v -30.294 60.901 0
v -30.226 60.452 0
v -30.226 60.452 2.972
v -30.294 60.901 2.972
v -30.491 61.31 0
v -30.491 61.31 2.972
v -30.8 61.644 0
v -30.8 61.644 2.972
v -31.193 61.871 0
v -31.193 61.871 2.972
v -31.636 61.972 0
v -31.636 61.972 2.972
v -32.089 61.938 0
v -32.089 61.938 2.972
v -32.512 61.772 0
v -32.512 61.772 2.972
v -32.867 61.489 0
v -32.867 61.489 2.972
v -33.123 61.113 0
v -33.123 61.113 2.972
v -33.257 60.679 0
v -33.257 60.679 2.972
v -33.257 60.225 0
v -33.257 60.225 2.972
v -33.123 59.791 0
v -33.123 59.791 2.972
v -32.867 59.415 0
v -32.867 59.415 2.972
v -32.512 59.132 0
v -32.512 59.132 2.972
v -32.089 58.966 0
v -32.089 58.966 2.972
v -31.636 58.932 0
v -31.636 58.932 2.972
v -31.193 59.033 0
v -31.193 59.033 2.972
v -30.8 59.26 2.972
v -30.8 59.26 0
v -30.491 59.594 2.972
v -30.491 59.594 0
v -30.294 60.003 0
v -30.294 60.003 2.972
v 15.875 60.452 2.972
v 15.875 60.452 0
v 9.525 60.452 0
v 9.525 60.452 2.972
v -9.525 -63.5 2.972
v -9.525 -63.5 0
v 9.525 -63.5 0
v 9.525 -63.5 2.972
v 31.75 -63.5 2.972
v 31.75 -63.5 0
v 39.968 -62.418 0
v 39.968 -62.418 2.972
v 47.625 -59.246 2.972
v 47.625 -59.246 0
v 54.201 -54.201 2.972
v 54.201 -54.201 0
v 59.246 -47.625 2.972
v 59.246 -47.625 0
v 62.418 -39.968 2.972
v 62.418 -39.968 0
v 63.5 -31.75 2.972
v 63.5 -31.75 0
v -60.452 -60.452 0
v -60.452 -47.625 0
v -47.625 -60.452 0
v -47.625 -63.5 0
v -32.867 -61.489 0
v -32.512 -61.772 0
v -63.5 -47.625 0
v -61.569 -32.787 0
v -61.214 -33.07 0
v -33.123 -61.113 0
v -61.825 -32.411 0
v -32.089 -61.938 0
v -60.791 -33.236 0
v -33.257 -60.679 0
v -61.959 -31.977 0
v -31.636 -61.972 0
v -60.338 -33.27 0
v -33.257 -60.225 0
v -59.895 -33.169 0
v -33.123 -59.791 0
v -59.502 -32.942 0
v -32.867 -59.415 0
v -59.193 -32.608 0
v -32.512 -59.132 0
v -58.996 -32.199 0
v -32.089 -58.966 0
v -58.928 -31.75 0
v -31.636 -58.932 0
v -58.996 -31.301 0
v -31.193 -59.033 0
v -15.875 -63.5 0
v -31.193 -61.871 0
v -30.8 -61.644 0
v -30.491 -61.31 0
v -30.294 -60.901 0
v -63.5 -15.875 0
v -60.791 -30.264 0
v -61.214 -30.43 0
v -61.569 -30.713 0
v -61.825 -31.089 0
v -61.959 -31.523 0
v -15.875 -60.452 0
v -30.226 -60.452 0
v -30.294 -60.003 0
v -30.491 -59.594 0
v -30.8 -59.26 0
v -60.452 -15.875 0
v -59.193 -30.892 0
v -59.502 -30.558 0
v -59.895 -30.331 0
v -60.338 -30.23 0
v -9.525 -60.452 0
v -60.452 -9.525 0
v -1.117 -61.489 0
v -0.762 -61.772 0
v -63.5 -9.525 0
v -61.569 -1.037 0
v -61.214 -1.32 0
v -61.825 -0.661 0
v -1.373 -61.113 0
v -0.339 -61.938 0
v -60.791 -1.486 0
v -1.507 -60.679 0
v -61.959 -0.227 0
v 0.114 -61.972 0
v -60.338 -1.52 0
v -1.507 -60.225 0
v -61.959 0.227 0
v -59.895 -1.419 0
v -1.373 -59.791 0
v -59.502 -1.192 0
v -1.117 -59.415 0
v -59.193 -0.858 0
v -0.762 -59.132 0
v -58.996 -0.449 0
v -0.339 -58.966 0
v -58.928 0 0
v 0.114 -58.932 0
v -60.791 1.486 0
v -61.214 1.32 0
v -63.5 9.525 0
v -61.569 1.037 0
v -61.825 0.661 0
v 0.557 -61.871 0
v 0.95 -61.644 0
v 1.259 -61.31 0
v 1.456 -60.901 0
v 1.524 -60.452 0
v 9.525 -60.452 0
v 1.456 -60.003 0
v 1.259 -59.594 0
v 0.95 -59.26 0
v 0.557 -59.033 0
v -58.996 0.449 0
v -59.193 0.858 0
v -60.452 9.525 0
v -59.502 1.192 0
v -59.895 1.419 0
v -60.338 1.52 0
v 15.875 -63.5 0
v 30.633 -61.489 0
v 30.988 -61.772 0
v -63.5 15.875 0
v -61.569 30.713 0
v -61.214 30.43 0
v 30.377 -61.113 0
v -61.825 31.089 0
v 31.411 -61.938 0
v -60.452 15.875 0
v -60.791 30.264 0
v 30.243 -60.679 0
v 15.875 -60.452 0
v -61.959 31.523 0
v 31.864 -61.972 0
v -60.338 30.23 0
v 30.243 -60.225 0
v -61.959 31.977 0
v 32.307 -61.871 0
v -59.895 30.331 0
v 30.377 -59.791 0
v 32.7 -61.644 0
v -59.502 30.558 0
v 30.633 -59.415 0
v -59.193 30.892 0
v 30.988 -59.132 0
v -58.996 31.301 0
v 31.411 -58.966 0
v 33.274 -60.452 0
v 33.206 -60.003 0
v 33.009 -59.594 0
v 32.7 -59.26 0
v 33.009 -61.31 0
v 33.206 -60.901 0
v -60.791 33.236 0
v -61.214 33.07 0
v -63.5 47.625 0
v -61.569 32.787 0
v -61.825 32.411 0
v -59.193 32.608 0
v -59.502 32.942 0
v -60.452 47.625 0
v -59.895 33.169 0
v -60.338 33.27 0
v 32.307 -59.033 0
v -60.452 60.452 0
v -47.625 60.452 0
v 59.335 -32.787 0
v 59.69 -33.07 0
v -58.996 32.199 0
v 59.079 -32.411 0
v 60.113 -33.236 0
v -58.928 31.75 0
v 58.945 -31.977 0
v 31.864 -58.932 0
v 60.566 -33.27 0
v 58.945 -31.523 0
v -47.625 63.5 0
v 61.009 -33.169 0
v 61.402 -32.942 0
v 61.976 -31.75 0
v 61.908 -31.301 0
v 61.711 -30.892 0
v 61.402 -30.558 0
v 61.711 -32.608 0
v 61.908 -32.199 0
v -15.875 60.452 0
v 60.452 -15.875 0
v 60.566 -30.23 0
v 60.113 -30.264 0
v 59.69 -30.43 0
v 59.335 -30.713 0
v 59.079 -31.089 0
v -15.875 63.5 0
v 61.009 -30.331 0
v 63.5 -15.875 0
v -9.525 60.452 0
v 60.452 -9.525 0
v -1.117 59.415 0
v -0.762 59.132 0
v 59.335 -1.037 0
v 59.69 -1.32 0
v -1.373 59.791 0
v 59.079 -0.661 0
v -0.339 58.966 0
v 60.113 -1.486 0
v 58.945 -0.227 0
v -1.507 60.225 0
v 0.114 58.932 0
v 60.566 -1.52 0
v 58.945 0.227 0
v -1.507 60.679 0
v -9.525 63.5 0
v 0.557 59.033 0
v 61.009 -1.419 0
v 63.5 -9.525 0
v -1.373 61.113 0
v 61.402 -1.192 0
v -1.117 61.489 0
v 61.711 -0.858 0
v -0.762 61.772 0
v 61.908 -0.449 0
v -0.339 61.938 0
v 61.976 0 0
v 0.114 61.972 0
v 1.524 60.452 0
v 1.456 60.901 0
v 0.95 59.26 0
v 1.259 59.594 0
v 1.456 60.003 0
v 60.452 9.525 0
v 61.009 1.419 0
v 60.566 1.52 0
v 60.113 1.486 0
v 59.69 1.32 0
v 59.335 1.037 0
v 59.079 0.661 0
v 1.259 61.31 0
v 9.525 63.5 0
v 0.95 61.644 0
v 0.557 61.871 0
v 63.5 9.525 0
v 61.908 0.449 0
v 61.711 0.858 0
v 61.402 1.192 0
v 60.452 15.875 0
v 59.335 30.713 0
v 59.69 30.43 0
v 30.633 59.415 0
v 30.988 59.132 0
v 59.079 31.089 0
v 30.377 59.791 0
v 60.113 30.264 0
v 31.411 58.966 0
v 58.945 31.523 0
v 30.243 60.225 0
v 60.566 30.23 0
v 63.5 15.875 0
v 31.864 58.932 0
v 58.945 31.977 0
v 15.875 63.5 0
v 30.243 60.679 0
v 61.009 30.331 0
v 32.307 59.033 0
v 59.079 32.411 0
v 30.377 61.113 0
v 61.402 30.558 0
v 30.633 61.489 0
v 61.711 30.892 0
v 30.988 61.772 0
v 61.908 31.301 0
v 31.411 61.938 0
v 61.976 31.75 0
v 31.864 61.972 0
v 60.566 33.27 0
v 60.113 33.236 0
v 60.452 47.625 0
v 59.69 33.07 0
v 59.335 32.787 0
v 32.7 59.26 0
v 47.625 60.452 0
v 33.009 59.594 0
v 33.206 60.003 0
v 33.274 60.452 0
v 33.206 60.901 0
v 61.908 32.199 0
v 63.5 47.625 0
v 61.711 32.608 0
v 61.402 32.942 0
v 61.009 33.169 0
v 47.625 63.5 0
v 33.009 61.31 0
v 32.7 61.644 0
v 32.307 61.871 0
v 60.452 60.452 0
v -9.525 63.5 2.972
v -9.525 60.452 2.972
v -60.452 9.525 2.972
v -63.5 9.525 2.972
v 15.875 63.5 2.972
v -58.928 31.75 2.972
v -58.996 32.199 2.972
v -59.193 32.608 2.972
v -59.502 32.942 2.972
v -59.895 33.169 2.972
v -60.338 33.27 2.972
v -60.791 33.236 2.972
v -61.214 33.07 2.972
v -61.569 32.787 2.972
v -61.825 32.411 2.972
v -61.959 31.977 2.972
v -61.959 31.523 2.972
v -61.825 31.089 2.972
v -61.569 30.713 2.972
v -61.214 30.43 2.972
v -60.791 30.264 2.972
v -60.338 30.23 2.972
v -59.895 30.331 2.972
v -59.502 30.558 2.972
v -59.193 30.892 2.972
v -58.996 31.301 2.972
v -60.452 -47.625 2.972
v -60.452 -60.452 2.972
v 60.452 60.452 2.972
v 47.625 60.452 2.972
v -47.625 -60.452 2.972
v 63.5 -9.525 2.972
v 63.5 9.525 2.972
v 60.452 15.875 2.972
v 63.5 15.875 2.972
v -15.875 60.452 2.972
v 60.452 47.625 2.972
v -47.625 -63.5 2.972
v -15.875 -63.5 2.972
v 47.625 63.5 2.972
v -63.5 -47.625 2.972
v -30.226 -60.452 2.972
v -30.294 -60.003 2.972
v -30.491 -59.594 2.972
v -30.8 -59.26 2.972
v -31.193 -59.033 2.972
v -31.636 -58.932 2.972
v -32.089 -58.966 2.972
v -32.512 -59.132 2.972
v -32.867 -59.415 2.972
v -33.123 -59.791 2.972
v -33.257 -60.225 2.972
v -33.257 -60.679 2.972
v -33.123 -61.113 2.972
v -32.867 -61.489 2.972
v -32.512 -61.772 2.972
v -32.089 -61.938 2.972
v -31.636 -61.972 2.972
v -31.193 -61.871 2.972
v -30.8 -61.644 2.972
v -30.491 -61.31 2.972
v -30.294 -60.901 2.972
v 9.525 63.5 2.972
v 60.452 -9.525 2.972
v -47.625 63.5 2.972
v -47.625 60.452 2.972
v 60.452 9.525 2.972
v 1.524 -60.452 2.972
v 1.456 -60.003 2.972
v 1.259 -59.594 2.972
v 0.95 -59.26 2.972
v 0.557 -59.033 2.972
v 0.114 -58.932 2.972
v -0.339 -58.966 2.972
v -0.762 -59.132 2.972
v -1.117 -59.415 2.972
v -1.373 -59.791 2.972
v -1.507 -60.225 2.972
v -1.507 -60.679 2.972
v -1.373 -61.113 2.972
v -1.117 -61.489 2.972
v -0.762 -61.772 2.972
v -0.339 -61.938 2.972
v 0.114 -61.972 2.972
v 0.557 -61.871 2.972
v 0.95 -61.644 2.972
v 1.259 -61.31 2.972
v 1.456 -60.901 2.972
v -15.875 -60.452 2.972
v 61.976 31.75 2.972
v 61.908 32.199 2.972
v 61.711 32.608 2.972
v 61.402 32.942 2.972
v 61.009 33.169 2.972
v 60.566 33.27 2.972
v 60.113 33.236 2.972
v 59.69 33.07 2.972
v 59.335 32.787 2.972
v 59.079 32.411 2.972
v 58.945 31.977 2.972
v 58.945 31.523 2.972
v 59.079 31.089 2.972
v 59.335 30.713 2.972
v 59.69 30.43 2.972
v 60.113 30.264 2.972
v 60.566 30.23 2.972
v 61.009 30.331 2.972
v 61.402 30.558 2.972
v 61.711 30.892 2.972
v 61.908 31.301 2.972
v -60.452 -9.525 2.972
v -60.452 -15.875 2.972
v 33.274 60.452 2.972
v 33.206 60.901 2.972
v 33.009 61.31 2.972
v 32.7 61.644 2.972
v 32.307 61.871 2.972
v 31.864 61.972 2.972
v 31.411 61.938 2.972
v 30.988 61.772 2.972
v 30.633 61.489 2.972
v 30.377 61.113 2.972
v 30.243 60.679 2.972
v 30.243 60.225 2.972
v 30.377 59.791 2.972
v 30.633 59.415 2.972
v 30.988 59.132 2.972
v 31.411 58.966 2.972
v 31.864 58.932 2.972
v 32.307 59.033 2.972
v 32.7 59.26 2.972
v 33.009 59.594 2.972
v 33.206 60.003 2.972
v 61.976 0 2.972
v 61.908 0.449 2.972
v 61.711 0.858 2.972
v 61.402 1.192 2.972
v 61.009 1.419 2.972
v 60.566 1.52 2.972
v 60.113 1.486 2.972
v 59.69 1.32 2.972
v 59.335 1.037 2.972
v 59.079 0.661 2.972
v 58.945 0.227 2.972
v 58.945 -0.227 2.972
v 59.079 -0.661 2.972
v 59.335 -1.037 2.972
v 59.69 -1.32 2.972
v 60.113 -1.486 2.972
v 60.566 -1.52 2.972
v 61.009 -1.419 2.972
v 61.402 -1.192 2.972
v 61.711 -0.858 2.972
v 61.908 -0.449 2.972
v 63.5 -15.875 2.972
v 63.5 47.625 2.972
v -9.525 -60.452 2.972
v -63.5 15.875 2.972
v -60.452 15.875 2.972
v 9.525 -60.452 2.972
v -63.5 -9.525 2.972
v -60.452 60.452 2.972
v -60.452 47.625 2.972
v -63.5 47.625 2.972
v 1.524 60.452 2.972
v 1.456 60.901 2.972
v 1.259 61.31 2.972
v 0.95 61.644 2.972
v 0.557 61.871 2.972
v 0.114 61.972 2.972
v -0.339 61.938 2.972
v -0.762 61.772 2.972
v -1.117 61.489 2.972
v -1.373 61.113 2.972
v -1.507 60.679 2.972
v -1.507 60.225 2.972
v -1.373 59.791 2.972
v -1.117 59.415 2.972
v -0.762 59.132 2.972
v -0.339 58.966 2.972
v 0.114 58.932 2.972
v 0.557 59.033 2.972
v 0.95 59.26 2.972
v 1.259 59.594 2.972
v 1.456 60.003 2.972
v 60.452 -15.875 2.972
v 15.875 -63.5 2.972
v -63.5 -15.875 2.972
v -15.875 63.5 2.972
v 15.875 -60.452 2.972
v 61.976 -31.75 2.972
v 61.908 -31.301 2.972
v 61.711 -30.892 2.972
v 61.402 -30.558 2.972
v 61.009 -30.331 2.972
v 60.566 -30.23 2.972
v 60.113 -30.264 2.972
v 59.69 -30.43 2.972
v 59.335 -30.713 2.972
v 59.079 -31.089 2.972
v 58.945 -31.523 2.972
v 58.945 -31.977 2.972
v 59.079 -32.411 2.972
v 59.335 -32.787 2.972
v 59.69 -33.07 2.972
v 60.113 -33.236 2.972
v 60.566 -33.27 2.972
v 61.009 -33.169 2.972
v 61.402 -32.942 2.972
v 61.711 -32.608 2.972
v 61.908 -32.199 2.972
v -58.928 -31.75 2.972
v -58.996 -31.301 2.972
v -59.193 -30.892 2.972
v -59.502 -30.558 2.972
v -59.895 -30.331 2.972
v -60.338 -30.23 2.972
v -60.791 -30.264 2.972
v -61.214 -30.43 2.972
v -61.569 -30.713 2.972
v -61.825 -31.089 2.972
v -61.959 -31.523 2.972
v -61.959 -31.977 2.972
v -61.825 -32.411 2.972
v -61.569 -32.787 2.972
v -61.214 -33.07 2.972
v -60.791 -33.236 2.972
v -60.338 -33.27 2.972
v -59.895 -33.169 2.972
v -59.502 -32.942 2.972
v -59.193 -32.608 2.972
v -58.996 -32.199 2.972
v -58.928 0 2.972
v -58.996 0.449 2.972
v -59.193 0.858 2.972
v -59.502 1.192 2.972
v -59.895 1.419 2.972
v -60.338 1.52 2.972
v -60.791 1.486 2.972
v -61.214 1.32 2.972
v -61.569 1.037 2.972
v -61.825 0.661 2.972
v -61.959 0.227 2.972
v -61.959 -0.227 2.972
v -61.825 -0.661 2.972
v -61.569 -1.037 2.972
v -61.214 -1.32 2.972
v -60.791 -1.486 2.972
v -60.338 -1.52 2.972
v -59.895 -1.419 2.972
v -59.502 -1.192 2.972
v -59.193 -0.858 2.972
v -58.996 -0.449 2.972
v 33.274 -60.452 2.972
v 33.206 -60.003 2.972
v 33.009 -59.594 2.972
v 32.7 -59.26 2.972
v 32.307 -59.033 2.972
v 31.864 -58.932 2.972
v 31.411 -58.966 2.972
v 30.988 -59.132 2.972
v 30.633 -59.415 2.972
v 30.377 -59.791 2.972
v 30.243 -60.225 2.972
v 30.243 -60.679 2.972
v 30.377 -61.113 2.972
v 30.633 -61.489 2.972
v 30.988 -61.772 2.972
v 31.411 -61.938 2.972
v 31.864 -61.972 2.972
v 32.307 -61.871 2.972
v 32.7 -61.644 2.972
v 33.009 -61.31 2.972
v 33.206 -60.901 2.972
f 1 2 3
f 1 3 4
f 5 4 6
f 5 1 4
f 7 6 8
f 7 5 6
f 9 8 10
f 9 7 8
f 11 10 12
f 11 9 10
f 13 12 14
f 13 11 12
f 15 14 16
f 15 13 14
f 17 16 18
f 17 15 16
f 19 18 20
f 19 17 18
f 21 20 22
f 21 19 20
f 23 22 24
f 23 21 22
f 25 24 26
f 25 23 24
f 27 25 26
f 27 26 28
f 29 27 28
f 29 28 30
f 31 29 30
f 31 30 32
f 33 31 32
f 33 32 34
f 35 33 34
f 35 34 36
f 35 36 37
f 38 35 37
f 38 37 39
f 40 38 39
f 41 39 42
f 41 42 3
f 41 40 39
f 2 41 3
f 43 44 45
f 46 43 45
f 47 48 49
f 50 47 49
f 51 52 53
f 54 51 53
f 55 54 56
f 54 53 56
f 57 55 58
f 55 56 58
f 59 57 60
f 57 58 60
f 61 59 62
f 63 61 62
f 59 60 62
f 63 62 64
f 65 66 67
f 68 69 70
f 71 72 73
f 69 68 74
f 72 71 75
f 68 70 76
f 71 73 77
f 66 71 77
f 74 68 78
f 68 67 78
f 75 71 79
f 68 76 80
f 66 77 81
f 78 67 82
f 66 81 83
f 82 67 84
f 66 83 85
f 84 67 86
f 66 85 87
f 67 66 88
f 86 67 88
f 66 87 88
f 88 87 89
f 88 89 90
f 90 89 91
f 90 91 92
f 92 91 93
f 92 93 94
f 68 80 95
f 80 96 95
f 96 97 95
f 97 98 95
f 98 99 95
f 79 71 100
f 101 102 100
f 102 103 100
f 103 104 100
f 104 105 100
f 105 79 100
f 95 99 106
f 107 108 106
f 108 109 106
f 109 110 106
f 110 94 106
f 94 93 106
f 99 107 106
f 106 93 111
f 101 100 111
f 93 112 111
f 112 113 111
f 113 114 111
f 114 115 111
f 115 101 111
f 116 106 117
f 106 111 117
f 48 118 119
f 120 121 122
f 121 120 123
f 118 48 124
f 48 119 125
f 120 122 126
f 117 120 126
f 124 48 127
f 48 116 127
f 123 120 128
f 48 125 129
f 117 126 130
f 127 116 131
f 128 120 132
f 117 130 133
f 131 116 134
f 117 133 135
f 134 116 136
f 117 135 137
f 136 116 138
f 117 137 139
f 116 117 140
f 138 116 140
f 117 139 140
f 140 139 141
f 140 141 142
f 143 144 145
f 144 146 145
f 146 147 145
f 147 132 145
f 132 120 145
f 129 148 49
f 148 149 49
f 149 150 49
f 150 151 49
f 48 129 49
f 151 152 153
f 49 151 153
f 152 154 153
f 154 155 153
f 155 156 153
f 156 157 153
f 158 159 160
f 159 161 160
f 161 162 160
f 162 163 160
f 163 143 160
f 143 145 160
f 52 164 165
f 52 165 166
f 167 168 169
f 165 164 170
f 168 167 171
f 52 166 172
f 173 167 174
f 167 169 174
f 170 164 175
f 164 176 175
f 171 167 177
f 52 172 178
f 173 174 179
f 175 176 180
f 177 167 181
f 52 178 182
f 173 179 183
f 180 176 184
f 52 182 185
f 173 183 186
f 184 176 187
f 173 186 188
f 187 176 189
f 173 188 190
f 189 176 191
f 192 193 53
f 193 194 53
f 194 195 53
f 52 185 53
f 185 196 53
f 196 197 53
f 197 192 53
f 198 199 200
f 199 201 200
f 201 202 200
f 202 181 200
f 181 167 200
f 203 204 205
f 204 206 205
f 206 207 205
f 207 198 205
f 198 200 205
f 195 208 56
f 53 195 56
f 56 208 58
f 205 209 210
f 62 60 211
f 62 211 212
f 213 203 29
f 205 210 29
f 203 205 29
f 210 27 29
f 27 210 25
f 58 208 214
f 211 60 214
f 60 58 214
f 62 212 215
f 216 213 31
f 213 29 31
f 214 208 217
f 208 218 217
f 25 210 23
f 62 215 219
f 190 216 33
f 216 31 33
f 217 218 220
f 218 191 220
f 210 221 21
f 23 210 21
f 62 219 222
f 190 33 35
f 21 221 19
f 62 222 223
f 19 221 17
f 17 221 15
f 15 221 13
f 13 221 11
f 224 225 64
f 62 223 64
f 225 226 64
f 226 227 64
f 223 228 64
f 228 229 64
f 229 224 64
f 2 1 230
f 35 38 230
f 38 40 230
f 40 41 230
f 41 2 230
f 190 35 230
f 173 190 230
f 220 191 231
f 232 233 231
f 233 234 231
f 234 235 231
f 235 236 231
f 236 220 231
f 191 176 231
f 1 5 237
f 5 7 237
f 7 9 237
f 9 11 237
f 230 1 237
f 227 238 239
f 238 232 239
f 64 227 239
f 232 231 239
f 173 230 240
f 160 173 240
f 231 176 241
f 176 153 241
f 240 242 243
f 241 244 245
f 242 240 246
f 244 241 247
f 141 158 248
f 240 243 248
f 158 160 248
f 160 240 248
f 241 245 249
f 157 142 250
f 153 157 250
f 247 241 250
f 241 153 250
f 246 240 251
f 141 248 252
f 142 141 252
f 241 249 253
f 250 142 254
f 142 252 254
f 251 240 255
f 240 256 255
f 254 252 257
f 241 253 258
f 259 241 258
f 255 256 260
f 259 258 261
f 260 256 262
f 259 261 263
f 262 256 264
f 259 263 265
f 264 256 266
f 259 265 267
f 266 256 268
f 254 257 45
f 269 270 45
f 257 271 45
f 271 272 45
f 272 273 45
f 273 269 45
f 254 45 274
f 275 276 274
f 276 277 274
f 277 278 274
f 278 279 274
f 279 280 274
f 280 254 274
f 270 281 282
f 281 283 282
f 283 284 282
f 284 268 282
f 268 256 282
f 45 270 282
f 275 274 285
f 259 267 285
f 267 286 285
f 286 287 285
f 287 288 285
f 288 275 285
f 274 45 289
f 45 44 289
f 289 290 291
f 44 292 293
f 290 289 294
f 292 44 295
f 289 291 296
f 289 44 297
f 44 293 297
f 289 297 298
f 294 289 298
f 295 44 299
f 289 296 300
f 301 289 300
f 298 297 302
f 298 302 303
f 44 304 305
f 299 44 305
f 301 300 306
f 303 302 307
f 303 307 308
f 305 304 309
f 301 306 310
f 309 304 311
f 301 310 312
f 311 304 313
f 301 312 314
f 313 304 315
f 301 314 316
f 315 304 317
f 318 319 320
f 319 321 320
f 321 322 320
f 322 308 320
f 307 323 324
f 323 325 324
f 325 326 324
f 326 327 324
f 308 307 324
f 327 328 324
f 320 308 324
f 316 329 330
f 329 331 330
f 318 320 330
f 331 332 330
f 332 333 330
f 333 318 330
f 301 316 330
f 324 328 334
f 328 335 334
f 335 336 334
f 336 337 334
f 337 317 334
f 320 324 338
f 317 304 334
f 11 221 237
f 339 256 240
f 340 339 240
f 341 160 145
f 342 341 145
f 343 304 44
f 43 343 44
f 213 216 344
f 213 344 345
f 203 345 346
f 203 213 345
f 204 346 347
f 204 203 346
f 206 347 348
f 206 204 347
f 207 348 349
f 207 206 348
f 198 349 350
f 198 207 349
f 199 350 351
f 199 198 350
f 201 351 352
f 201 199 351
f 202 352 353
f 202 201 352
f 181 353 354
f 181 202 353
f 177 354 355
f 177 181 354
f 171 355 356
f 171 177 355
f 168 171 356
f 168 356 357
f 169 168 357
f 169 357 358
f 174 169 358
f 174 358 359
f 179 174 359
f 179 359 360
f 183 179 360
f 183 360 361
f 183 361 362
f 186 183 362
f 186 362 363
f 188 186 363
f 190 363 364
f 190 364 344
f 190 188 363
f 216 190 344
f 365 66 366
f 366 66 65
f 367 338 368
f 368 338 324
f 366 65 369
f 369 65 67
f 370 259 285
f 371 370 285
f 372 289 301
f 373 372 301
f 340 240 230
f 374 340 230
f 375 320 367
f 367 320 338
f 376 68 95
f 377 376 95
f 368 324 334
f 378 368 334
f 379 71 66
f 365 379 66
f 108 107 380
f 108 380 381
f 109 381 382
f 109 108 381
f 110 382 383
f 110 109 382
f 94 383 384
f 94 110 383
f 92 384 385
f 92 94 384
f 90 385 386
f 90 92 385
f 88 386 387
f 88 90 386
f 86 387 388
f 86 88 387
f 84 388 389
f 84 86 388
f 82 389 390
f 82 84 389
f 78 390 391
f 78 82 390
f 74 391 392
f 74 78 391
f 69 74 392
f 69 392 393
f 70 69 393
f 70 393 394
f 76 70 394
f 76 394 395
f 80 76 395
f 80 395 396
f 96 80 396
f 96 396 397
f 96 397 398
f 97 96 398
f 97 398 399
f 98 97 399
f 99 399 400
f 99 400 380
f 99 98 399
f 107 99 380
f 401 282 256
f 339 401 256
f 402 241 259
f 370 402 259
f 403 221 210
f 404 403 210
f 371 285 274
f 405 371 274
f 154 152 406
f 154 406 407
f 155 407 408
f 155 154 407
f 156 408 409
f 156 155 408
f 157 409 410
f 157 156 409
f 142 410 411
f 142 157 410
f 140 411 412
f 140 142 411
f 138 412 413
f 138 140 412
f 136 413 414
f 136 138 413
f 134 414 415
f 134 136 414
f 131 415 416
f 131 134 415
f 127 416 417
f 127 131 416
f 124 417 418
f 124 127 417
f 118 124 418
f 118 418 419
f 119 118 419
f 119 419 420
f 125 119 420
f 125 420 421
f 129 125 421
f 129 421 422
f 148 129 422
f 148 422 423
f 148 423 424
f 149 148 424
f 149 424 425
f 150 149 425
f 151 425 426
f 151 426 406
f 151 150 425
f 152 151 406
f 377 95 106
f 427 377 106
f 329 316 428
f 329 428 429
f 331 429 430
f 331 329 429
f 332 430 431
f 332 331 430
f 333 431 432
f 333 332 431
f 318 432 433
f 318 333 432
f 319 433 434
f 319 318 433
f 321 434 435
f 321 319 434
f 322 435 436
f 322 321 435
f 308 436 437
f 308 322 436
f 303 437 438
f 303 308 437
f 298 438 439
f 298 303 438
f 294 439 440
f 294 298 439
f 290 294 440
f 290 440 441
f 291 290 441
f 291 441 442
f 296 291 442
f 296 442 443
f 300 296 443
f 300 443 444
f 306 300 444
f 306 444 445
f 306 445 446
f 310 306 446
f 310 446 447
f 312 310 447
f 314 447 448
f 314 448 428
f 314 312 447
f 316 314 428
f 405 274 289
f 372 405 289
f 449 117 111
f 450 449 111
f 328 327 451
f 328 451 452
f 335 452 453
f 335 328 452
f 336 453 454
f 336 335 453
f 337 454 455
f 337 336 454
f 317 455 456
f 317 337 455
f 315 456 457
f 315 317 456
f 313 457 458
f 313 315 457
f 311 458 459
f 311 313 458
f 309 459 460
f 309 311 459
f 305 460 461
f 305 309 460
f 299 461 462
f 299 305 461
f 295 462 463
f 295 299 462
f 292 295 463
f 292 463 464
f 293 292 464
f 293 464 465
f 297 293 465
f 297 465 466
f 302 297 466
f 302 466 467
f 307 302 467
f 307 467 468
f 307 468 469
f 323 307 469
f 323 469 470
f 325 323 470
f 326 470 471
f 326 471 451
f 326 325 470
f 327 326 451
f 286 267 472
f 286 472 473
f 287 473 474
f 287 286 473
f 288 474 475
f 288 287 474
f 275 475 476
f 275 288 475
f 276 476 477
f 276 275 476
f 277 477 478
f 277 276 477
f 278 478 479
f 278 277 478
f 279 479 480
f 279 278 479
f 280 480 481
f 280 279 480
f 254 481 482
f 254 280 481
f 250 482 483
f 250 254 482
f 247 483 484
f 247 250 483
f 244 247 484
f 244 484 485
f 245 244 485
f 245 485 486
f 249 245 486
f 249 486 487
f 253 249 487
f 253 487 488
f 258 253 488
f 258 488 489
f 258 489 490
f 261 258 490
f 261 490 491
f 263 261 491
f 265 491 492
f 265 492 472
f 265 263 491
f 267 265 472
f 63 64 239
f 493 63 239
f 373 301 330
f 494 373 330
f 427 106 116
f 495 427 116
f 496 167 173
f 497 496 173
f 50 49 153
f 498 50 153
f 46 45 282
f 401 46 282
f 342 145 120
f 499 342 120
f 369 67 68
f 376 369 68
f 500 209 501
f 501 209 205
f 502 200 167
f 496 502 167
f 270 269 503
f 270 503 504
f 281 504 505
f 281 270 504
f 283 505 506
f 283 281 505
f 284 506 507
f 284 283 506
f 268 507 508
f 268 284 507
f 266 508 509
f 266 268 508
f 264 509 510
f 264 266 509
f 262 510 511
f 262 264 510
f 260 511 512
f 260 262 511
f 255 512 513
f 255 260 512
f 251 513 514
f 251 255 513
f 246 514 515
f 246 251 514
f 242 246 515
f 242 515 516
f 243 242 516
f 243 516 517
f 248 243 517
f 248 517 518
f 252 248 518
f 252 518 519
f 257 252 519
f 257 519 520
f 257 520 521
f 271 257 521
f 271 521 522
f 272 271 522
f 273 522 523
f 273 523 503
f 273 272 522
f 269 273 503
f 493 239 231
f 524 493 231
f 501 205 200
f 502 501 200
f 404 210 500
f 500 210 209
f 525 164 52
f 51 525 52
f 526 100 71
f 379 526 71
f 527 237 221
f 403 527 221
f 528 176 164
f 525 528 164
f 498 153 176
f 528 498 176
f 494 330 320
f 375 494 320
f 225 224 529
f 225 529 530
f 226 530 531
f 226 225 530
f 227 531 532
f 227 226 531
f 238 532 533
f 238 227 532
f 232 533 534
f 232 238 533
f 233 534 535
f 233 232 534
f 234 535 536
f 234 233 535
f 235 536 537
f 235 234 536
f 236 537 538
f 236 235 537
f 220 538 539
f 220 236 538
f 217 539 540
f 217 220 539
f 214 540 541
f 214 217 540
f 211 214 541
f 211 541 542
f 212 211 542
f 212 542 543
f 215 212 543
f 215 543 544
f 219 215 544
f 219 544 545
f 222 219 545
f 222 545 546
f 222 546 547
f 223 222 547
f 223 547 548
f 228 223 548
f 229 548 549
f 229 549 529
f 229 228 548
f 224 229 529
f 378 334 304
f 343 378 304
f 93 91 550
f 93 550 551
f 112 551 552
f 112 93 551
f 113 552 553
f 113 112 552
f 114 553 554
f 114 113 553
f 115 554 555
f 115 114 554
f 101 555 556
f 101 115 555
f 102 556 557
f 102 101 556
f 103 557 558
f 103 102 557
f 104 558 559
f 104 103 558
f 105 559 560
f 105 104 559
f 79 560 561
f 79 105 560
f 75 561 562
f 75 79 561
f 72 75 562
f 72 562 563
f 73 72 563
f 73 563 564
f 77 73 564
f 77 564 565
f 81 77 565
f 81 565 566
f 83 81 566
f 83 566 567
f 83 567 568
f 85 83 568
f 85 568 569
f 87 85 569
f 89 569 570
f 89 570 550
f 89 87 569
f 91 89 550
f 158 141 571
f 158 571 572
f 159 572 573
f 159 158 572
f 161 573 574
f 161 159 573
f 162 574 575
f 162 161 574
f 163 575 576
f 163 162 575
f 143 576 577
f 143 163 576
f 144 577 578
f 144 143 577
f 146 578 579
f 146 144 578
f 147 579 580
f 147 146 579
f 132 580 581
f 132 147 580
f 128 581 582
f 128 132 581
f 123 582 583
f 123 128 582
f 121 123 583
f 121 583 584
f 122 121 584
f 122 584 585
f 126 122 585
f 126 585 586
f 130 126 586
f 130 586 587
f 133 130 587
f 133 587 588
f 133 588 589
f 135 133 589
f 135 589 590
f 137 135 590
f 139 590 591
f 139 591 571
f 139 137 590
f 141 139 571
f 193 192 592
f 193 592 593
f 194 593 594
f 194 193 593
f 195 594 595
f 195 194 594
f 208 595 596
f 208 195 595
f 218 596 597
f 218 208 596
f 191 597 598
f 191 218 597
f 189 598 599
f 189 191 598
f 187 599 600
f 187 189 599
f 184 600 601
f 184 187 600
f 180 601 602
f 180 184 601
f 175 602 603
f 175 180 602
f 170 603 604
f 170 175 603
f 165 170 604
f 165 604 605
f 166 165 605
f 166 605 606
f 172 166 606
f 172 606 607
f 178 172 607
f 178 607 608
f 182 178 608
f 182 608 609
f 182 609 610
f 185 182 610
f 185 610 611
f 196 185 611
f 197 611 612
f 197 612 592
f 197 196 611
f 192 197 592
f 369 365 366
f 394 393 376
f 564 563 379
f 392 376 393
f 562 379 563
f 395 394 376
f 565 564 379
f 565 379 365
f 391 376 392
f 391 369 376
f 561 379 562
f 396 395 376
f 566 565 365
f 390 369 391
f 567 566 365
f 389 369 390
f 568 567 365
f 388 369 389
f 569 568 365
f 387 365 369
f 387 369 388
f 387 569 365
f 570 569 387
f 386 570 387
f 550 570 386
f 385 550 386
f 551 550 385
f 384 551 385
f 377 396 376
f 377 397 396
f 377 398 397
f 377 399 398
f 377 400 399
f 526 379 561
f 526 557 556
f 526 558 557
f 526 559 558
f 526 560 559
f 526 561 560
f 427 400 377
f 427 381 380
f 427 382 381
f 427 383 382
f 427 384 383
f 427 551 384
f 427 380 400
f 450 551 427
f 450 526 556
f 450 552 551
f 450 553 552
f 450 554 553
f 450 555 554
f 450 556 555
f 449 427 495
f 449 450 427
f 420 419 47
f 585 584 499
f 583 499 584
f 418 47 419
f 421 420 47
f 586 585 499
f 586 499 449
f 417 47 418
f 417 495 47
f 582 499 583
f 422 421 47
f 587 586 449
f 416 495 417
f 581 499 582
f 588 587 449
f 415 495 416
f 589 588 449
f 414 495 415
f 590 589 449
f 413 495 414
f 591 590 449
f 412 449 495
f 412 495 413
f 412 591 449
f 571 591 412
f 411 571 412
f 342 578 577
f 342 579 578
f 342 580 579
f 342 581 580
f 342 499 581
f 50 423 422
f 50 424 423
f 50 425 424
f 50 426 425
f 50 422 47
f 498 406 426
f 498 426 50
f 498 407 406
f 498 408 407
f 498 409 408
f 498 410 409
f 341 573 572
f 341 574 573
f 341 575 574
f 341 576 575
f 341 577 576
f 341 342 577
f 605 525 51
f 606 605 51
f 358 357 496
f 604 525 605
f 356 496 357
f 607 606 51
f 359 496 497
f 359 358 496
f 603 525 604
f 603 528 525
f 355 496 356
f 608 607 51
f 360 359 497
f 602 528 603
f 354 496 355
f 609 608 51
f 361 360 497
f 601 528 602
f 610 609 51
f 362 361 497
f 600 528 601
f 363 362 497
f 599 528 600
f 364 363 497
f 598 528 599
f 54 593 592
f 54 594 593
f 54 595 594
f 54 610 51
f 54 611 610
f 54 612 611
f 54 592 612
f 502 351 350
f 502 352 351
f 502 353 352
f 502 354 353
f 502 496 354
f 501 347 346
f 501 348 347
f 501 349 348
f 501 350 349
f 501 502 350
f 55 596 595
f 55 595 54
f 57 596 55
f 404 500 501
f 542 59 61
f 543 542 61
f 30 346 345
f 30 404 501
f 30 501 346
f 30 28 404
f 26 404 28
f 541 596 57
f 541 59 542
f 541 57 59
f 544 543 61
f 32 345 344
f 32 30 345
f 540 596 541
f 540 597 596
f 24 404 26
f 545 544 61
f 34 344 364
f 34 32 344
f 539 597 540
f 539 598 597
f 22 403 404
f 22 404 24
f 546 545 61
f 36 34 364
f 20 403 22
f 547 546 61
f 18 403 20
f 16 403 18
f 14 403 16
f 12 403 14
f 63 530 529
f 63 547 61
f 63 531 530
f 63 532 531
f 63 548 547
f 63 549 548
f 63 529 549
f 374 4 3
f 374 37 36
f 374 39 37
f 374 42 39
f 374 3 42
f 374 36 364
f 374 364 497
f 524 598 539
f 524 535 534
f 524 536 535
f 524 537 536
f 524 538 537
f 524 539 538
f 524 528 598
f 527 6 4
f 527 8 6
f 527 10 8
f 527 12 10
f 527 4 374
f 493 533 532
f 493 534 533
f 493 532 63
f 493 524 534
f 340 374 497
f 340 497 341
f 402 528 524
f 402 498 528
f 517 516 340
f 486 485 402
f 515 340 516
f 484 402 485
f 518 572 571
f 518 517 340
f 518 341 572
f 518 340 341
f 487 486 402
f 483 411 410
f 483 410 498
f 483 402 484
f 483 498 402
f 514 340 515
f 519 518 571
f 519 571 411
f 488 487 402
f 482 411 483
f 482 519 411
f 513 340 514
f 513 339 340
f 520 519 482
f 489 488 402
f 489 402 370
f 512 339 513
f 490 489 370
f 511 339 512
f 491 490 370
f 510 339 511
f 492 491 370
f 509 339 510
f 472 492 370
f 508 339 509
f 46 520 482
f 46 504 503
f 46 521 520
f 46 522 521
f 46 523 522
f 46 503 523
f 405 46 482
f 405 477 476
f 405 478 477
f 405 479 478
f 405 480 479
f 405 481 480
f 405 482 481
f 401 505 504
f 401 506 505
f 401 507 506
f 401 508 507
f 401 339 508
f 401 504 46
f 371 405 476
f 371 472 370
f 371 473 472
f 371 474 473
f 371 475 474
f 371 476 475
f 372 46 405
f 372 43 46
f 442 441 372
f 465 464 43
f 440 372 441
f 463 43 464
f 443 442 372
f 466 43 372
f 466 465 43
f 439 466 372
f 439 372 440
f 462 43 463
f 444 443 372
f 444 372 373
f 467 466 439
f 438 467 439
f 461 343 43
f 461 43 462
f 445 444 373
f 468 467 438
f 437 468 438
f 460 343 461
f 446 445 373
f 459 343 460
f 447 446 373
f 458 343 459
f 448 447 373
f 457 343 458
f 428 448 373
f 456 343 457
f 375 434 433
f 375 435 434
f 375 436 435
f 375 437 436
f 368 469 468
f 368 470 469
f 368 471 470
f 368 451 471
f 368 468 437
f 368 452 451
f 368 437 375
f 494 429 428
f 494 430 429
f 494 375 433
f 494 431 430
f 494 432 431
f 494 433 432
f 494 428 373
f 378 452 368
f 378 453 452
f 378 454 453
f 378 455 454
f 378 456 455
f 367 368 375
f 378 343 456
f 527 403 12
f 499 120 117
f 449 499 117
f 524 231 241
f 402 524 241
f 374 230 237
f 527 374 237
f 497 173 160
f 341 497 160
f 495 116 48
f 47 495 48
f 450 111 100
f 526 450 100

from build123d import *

# Parameters (mm, degrees)
F0_R     = 1.524
F1_DEPTH = 2.9718


with BuildPart() as f1:
    # F0 (on Top) → F1 (new body)
    with BuildSketch(Plane.XY):
        with BuildLine():
            Line((63.5, 15.875), (63.5, 47.625))
            Line((63.5, 47.625), (60.452, 47.625))
            Line((60.452, 47.625), (60.452, 60.452))
            Line((60.452, 60.452), (47.625, 60.452))
            Line((47.625, 60.452), (47.625, 63.5))
            Line((47.625, 63.5), (15.875, 63.5))
            Line((15.875, 63.5), (15.875, 60.452))
            Line((15.875, 60.452), (9.525, 60.452))
            Line((9.525, 60.452), (9.525, 63.5))
            Line((9.525, 63.5), (-9.525, 63.5))
            Line((-9.525, 63.5), (-9.525, 60.452))
            Line((-9.525, 60.452), (-15.875, 60.452))
            Line((-15.875, 60.452), (-15.875, 63.5))
            Line((-15.875, 63.5), (-47.625, 63.5))
            Line((-47.625, 63.5), (-47.625, 60.452))
            Line((-47.625, 60.452), (-60.452, 60.452))
            Line((-60.452, 60.452), (-60.452, 47.625))
            Line((-60.452, 47.625), (-63.5, 47.625))
            Line((-63.5, 47.625), (-63.5, 15.875))
            Line((-63.5, 15.875), (-60.452, 15.875))
            Line((-60.452, 15.875), (-60.452, 9.525))
            Line((-60.452, 9.525), (-63.5, 9.525))
            Line((-63.5, 9.525), (-63.5, -9.525))
            Line((-63.5, -9.525), (-60.452, -9.525))
            Line((-60.452, -9.525), (-60.452, -15.875))
            Line((-60.452, -15.875), (-63.5, -15.875))
            Line((-63.5, -15.875), (-63.5, -47.625))
            Line((-63.5, -47.625), (-60.452, -47.625))
            Line((-60.452, -47.625), (-60.452, -60.452))
            Line((-60.452, -60.452), (-47.625, -60.452))
            Line((-47.625, -60.452), (-47.625, -63.5))
            Line((-47.625, -63.5), (-15.875, -63.5))
            Line((-15.875, -63.5), (-15.875, -60.452))
            Line((-15.875, -60.452), (-9.525, -60.452))
            Line((-9.525, -60.452), (-9.525, -63.5))
            Line((-9.525, -63.5), (9.525, -63.5))
            Line((9.525, -63.5), (9.525, -60.452))
            Line((9.525, -60.452), (15.875, -60.452))
            Line((15.875, -60.452), (15.875, -63.5))
            Line((15.875, -63.5), (31.75, -63.5))
            ThreePointArc((31.75, -63.5), (54.20064, -54.20064), (63.5, -31.75))
            Line((63.5, -31.75), (63.5, -15.875))
            Line((63.5, -15.875), (60.452, -15.875))
            Line((60.452, -15.875), (60.452, -9.525))
            Line((60.452, -9.525), (63.5, -9.525))
            Line((63.5, -9.525), (63.5, 9.525))
            Line((63.5, 9.525), (60.452, 9.525))
            Line((60.452, 9.525), (60.452, 15.875))
            Line((60.452, 15.875), (63.5, 15.875))
        make_face()
        with Locations((-31.75, -60.452)):
            Circle(F0_R, mode=Mode.SUBTRACT)
        with Locations((-60.452, -31.75)):
            Circle(F0_R, mode=Mode.SUBTRACT)
        with Locations((0, -60.452)):
            Circle(F0_R, mode=Mode.SUBTRACT)
        with Locations((31.75, -60.452)):
            Circle(F0_R, mode=Mode.SUBTRACT)
        with Locations((60.452, -31.75)):
            Circle(F0_R, mode=Mode.SUBTRACT)
        with Locations((-60.452, 0)):
            Circle(F0_R, mode=Mode.SUBTRACT)
        with Locations((-60.452, 31.75)):
            Circle(F0_R, mode=Mode.SUBTRACT)
        with Locations((-31.75, 60.452)):
            Circle(F0_R, mode=Mode.SUBTRACT)
        with Locations((60.452, 0)):
            Circle(F0_R, mode=Mode.SUBTRACT)
        with Locations((0, 60.452)):
            Circle(F0_R, mode=Mode.SUBTRACT)
        with Locations((60.452, 31.75)):
            Circle(F0_R, mode=Mode.SUBTRACT)
        with Locations((31.75, 60.452)):
            Circle(F0_R, mode=Mode.SUBTRACT)
    extrude(amount=F1_DEPTH)


solid = f1.part
